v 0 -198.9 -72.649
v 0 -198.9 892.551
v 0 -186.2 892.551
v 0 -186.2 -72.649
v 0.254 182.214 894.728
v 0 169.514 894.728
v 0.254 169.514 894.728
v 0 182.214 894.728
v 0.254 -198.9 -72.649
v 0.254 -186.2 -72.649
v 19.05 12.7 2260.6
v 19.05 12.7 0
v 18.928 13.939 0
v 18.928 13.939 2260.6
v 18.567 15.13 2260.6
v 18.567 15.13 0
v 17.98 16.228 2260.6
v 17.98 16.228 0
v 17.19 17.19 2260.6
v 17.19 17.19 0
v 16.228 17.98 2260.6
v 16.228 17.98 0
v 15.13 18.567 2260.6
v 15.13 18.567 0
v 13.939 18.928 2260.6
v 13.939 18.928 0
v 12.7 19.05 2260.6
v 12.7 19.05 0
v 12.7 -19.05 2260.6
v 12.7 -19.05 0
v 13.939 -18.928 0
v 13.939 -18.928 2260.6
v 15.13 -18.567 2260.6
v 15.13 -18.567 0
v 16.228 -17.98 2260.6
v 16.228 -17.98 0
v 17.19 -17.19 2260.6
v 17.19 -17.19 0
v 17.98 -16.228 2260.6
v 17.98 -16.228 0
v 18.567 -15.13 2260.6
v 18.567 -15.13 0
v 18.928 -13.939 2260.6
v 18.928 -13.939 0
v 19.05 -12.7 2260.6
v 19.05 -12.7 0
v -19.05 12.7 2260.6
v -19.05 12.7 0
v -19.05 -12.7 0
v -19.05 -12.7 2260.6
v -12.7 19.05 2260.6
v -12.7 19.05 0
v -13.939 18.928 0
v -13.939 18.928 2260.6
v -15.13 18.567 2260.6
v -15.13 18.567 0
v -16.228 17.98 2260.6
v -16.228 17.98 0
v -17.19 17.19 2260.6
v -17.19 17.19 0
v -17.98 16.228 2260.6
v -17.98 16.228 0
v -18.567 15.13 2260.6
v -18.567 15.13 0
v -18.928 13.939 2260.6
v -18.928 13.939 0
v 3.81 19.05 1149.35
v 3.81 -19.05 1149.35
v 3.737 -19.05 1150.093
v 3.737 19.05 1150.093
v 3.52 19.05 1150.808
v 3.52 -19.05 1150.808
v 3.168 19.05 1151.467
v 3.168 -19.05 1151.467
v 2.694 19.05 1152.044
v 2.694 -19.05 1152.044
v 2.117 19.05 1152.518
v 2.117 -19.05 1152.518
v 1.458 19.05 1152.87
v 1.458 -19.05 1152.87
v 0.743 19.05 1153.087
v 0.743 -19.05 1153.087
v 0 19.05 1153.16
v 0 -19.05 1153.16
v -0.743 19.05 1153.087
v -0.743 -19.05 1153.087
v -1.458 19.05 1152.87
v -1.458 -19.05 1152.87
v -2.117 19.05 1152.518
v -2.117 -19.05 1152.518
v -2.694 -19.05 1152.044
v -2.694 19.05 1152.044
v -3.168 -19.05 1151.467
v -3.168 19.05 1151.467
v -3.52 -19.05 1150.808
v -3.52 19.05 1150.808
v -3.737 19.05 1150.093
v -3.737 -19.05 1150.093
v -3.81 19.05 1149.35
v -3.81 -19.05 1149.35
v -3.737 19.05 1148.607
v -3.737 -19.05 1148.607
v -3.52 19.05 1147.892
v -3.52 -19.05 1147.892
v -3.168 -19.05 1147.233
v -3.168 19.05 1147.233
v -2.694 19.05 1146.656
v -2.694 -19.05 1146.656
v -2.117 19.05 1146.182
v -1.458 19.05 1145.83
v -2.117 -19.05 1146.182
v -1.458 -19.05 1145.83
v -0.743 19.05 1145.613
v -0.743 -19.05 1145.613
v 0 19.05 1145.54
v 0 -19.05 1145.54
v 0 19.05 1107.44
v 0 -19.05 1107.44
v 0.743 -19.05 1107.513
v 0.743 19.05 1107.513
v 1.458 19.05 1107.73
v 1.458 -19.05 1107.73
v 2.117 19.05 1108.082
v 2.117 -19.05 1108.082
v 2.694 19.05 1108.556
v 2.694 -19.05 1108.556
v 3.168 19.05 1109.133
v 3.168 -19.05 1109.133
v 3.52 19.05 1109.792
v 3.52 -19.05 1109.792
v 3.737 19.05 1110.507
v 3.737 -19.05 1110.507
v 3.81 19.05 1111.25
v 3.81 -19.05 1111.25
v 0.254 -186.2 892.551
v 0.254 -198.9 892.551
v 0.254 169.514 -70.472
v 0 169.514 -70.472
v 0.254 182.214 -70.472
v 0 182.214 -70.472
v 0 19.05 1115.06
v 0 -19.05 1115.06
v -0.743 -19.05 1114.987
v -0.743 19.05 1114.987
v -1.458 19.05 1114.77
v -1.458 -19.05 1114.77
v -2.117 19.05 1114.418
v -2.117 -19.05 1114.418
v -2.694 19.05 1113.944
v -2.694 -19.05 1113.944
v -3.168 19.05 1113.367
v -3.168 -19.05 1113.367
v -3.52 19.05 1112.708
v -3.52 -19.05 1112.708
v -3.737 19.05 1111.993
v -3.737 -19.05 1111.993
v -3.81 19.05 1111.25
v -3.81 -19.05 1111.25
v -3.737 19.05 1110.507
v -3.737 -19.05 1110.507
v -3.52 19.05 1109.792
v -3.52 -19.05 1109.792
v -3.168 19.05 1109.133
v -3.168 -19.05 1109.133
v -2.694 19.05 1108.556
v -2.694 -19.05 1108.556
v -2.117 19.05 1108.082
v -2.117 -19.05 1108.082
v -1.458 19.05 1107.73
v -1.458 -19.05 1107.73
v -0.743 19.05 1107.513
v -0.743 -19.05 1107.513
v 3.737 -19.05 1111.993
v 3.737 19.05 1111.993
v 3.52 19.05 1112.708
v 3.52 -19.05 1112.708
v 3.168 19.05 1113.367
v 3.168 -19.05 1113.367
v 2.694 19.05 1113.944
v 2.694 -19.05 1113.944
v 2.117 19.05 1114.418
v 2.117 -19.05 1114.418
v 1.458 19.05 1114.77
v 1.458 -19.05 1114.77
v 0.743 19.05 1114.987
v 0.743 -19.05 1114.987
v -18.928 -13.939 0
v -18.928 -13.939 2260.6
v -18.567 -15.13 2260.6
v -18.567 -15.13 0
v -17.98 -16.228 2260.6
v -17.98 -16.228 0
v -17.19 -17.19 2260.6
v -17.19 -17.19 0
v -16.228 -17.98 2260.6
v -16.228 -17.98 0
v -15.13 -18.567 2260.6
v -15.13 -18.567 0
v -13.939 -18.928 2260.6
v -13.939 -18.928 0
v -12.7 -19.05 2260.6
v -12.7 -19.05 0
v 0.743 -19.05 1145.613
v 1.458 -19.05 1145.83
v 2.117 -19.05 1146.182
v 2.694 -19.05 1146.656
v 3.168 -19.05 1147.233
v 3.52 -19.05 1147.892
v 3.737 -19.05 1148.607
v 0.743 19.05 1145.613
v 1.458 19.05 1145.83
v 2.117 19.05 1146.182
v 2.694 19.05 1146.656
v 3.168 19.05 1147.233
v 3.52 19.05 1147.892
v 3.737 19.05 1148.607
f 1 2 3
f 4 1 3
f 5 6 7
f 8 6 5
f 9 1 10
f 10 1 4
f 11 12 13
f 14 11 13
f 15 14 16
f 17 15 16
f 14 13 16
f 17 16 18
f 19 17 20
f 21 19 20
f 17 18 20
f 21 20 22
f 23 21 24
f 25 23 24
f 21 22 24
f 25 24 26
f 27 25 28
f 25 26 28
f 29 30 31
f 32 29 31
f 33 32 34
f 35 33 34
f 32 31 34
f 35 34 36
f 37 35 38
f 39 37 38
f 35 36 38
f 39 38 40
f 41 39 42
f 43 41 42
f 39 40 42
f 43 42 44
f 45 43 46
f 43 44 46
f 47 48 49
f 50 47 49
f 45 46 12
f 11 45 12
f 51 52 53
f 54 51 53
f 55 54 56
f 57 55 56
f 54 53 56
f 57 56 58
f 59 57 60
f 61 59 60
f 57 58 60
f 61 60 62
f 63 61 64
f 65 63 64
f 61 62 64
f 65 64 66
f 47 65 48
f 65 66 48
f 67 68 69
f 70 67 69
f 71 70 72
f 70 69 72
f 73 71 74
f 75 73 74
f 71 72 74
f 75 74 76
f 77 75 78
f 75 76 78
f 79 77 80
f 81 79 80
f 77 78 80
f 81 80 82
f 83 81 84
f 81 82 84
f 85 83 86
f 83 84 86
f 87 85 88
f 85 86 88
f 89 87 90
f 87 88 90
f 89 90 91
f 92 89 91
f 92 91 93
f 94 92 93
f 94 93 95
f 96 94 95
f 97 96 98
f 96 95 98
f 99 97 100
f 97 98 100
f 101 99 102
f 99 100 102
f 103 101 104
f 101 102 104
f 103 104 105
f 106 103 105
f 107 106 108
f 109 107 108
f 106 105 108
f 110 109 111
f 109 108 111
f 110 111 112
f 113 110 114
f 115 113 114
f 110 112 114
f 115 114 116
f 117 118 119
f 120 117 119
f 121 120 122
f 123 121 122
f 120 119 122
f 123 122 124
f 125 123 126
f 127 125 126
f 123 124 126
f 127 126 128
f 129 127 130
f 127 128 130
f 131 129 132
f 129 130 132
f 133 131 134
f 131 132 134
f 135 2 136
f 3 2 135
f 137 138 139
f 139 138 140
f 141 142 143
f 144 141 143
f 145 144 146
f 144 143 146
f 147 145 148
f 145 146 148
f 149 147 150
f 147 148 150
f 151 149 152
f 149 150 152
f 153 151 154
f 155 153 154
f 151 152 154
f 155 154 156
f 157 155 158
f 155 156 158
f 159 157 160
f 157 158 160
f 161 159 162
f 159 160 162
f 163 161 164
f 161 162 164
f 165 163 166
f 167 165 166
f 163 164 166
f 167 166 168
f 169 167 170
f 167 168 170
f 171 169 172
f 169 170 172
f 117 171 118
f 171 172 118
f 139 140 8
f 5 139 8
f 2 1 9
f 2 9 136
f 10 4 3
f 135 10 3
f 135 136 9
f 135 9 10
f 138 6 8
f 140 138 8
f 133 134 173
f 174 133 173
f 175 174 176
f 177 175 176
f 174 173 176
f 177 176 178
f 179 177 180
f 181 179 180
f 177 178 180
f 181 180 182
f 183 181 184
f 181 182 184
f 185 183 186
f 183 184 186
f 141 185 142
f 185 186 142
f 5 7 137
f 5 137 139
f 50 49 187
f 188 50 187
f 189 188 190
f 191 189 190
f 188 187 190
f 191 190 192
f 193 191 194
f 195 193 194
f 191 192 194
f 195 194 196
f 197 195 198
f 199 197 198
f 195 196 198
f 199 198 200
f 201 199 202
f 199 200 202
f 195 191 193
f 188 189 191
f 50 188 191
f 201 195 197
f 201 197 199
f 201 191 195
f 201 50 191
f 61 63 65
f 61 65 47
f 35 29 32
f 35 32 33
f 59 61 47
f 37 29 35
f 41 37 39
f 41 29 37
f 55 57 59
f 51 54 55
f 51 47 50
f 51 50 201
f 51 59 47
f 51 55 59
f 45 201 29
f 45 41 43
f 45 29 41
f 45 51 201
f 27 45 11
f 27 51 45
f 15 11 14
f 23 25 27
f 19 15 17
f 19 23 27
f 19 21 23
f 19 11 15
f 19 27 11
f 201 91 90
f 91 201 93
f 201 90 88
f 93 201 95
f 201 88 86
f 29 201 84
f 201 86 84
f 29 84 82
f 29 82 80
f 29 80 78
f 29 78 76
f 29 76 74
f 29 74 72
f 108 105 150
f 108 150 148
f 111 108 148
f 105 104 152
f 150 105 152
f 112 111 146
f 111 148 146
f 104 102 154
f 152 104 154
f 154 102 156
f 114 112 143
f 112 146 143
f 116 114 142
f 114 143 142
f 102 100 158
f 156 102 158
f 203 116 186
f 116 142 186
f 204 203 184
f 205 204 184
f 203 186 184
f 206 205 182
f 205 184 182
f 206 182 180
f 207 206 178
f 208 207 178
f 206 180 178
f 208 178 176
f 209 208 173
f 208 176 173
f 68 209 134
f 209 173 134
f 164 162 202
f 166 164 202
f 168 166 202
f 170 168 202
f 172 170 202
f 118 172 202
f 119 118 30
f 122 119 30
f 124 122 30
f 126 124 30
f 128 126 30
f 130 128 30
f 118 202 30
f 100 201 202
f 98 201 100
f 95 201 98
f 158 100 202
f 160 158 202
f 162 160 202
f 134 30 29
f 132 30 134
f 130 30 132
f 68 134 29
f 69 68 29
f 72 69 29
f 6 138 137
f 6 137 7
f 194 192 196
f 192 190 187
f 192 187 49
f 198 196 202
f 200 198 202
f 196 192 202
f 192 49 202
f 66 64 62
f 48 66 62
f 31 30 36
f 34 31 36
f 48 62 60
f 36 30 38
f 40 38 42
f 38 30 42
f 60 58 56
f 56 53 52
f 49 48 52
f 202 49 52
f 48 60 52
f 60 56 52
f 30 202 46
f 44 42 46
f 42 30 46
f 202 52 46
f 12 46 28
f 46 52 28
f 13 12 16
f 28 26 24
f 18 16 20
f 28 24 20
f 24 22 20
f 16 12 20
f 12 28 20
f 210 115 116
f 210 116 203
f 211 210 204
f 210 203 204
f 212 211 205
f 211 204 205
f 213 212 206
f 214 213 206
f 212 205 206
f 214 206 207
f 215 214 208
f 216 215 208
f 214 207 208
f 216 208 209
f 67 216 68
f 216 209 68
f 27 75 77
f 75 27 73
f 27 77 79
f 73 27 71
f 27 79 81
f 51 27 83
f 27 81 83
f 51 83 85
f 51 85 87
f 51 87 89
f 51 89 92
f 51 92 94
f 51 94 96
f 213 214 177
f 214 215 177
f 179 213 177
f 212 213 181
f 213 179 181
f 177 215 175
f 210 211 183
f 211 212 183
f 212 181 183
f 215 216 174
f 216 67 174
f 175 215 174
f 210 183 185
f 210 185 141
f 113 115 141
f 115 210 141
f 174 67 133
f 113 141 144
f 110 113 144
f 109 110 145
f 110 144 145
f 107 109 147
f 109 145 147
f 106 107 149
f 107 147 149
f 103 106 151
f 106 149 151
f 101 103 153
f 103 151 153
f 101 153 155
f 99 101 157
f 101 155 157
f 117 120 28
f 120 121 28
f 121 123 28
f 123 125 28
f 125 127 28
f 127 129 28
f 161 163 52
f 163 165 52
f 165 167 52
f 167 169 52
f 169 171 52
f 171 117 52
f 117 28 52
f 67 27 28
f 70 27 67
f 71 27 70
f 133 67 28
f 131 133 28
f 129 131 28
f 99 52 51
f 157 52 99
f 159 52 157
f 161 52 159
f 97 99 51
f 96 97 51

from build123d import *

# Parameters (mm, degrees)
F1_DEPTH = 2260.6
F2_W     = 12.7
F2_H     = 965.2
F4_DEPTH = 0.254
F3_W     = 12.7
F3_H     = 965.2
F5_DEPTH = 0.254
F7_DEPTH = 38.1


with BuildPart() as f1:
    # F0 (on Top) → F1 (new body)
    with BuildSketch(Plane.XY):
        with BuildLine():
            ThreePointArc((19.05, 12.7), (17.190128, 17.190128), (12.7, 19.05))
            Line((12.7, 19.05), (-12.7, 19.05))
            ThreePointArc((-12.7, 19.05), (-17.190128, 17.190128), (-19.05, 12.7))
            Line((-19.05, 12.7), (-19.05, -12.7))
            ThreePointArc((-19.05, -12.7), (-17.190128, -17.190128), (-12.7, -19.05))
            Line((-12.7, -19.05), (12.7, -19.05))
            ThreePointArc((12.7, -19.05), (17.190128, -17.190128), (19.05, -12.7))
            Line((19.05, -12.7), (19.05, 12.7))
        make_face()
    extrude(amount=F1_DEPTH)

    # F6 (on face) → F7 (cut)
    with BuildSketch(Plane.XZ.offset(19.05)):
        with BuildLine():
            ThreePointArc((0, 1115.06), (-3.81, 1111.25), (0, 1107.44))
            Line((0, 1107.44), (0, 1111.25))
            Line((0, 1111.25), (0, 1115.06))
        make_face()
        with BuildLine():
            ThreePointArc((3.81, 1149.35), (-2.694077, 1152.044077), (0, 1145.54))
            ThreePointArc((0, 1145.54), (2.694077, 1146.655923), (3.81, 1149.35))
        make_face()
        with BuildLine():
            Line((0, 1111.25), (0, 1107.44))
            ThreePointArc((0, 1107.44), (2.694077, 1108.555923), (3.81, 1111.25))
            ThreePointArc((3.81, 1111.25), (2.694077, 1113.944077), (0, 1115.06))
            Line((0, 1115.06), (0, 1111.25))
        make_face()
    extrude(amount=-F7_DEPTH, mode=Mode.SUBTRACT)


with BuildPart() as f4:
    # F2 (on Right) → F4 (new body)
    with BuildSketch(Plane.YZ):
        with Locations((-192.550282, 409.951065)):
            Rectangle(F2_W, F2_H)
    extrude(amount=F4_DEPTH)


with BuildPart() as f5:
    # F3 (on Right) → F5 (new body)
    with BuildSketch(Plane.YZ):
        with Locations((175.864179, 412.127815)):
            Rectangle(F3_W, F3_H)
    extrude(amount=F5_DEPTH)


solid = Compound([f1.part, f4.part, f5.part])
